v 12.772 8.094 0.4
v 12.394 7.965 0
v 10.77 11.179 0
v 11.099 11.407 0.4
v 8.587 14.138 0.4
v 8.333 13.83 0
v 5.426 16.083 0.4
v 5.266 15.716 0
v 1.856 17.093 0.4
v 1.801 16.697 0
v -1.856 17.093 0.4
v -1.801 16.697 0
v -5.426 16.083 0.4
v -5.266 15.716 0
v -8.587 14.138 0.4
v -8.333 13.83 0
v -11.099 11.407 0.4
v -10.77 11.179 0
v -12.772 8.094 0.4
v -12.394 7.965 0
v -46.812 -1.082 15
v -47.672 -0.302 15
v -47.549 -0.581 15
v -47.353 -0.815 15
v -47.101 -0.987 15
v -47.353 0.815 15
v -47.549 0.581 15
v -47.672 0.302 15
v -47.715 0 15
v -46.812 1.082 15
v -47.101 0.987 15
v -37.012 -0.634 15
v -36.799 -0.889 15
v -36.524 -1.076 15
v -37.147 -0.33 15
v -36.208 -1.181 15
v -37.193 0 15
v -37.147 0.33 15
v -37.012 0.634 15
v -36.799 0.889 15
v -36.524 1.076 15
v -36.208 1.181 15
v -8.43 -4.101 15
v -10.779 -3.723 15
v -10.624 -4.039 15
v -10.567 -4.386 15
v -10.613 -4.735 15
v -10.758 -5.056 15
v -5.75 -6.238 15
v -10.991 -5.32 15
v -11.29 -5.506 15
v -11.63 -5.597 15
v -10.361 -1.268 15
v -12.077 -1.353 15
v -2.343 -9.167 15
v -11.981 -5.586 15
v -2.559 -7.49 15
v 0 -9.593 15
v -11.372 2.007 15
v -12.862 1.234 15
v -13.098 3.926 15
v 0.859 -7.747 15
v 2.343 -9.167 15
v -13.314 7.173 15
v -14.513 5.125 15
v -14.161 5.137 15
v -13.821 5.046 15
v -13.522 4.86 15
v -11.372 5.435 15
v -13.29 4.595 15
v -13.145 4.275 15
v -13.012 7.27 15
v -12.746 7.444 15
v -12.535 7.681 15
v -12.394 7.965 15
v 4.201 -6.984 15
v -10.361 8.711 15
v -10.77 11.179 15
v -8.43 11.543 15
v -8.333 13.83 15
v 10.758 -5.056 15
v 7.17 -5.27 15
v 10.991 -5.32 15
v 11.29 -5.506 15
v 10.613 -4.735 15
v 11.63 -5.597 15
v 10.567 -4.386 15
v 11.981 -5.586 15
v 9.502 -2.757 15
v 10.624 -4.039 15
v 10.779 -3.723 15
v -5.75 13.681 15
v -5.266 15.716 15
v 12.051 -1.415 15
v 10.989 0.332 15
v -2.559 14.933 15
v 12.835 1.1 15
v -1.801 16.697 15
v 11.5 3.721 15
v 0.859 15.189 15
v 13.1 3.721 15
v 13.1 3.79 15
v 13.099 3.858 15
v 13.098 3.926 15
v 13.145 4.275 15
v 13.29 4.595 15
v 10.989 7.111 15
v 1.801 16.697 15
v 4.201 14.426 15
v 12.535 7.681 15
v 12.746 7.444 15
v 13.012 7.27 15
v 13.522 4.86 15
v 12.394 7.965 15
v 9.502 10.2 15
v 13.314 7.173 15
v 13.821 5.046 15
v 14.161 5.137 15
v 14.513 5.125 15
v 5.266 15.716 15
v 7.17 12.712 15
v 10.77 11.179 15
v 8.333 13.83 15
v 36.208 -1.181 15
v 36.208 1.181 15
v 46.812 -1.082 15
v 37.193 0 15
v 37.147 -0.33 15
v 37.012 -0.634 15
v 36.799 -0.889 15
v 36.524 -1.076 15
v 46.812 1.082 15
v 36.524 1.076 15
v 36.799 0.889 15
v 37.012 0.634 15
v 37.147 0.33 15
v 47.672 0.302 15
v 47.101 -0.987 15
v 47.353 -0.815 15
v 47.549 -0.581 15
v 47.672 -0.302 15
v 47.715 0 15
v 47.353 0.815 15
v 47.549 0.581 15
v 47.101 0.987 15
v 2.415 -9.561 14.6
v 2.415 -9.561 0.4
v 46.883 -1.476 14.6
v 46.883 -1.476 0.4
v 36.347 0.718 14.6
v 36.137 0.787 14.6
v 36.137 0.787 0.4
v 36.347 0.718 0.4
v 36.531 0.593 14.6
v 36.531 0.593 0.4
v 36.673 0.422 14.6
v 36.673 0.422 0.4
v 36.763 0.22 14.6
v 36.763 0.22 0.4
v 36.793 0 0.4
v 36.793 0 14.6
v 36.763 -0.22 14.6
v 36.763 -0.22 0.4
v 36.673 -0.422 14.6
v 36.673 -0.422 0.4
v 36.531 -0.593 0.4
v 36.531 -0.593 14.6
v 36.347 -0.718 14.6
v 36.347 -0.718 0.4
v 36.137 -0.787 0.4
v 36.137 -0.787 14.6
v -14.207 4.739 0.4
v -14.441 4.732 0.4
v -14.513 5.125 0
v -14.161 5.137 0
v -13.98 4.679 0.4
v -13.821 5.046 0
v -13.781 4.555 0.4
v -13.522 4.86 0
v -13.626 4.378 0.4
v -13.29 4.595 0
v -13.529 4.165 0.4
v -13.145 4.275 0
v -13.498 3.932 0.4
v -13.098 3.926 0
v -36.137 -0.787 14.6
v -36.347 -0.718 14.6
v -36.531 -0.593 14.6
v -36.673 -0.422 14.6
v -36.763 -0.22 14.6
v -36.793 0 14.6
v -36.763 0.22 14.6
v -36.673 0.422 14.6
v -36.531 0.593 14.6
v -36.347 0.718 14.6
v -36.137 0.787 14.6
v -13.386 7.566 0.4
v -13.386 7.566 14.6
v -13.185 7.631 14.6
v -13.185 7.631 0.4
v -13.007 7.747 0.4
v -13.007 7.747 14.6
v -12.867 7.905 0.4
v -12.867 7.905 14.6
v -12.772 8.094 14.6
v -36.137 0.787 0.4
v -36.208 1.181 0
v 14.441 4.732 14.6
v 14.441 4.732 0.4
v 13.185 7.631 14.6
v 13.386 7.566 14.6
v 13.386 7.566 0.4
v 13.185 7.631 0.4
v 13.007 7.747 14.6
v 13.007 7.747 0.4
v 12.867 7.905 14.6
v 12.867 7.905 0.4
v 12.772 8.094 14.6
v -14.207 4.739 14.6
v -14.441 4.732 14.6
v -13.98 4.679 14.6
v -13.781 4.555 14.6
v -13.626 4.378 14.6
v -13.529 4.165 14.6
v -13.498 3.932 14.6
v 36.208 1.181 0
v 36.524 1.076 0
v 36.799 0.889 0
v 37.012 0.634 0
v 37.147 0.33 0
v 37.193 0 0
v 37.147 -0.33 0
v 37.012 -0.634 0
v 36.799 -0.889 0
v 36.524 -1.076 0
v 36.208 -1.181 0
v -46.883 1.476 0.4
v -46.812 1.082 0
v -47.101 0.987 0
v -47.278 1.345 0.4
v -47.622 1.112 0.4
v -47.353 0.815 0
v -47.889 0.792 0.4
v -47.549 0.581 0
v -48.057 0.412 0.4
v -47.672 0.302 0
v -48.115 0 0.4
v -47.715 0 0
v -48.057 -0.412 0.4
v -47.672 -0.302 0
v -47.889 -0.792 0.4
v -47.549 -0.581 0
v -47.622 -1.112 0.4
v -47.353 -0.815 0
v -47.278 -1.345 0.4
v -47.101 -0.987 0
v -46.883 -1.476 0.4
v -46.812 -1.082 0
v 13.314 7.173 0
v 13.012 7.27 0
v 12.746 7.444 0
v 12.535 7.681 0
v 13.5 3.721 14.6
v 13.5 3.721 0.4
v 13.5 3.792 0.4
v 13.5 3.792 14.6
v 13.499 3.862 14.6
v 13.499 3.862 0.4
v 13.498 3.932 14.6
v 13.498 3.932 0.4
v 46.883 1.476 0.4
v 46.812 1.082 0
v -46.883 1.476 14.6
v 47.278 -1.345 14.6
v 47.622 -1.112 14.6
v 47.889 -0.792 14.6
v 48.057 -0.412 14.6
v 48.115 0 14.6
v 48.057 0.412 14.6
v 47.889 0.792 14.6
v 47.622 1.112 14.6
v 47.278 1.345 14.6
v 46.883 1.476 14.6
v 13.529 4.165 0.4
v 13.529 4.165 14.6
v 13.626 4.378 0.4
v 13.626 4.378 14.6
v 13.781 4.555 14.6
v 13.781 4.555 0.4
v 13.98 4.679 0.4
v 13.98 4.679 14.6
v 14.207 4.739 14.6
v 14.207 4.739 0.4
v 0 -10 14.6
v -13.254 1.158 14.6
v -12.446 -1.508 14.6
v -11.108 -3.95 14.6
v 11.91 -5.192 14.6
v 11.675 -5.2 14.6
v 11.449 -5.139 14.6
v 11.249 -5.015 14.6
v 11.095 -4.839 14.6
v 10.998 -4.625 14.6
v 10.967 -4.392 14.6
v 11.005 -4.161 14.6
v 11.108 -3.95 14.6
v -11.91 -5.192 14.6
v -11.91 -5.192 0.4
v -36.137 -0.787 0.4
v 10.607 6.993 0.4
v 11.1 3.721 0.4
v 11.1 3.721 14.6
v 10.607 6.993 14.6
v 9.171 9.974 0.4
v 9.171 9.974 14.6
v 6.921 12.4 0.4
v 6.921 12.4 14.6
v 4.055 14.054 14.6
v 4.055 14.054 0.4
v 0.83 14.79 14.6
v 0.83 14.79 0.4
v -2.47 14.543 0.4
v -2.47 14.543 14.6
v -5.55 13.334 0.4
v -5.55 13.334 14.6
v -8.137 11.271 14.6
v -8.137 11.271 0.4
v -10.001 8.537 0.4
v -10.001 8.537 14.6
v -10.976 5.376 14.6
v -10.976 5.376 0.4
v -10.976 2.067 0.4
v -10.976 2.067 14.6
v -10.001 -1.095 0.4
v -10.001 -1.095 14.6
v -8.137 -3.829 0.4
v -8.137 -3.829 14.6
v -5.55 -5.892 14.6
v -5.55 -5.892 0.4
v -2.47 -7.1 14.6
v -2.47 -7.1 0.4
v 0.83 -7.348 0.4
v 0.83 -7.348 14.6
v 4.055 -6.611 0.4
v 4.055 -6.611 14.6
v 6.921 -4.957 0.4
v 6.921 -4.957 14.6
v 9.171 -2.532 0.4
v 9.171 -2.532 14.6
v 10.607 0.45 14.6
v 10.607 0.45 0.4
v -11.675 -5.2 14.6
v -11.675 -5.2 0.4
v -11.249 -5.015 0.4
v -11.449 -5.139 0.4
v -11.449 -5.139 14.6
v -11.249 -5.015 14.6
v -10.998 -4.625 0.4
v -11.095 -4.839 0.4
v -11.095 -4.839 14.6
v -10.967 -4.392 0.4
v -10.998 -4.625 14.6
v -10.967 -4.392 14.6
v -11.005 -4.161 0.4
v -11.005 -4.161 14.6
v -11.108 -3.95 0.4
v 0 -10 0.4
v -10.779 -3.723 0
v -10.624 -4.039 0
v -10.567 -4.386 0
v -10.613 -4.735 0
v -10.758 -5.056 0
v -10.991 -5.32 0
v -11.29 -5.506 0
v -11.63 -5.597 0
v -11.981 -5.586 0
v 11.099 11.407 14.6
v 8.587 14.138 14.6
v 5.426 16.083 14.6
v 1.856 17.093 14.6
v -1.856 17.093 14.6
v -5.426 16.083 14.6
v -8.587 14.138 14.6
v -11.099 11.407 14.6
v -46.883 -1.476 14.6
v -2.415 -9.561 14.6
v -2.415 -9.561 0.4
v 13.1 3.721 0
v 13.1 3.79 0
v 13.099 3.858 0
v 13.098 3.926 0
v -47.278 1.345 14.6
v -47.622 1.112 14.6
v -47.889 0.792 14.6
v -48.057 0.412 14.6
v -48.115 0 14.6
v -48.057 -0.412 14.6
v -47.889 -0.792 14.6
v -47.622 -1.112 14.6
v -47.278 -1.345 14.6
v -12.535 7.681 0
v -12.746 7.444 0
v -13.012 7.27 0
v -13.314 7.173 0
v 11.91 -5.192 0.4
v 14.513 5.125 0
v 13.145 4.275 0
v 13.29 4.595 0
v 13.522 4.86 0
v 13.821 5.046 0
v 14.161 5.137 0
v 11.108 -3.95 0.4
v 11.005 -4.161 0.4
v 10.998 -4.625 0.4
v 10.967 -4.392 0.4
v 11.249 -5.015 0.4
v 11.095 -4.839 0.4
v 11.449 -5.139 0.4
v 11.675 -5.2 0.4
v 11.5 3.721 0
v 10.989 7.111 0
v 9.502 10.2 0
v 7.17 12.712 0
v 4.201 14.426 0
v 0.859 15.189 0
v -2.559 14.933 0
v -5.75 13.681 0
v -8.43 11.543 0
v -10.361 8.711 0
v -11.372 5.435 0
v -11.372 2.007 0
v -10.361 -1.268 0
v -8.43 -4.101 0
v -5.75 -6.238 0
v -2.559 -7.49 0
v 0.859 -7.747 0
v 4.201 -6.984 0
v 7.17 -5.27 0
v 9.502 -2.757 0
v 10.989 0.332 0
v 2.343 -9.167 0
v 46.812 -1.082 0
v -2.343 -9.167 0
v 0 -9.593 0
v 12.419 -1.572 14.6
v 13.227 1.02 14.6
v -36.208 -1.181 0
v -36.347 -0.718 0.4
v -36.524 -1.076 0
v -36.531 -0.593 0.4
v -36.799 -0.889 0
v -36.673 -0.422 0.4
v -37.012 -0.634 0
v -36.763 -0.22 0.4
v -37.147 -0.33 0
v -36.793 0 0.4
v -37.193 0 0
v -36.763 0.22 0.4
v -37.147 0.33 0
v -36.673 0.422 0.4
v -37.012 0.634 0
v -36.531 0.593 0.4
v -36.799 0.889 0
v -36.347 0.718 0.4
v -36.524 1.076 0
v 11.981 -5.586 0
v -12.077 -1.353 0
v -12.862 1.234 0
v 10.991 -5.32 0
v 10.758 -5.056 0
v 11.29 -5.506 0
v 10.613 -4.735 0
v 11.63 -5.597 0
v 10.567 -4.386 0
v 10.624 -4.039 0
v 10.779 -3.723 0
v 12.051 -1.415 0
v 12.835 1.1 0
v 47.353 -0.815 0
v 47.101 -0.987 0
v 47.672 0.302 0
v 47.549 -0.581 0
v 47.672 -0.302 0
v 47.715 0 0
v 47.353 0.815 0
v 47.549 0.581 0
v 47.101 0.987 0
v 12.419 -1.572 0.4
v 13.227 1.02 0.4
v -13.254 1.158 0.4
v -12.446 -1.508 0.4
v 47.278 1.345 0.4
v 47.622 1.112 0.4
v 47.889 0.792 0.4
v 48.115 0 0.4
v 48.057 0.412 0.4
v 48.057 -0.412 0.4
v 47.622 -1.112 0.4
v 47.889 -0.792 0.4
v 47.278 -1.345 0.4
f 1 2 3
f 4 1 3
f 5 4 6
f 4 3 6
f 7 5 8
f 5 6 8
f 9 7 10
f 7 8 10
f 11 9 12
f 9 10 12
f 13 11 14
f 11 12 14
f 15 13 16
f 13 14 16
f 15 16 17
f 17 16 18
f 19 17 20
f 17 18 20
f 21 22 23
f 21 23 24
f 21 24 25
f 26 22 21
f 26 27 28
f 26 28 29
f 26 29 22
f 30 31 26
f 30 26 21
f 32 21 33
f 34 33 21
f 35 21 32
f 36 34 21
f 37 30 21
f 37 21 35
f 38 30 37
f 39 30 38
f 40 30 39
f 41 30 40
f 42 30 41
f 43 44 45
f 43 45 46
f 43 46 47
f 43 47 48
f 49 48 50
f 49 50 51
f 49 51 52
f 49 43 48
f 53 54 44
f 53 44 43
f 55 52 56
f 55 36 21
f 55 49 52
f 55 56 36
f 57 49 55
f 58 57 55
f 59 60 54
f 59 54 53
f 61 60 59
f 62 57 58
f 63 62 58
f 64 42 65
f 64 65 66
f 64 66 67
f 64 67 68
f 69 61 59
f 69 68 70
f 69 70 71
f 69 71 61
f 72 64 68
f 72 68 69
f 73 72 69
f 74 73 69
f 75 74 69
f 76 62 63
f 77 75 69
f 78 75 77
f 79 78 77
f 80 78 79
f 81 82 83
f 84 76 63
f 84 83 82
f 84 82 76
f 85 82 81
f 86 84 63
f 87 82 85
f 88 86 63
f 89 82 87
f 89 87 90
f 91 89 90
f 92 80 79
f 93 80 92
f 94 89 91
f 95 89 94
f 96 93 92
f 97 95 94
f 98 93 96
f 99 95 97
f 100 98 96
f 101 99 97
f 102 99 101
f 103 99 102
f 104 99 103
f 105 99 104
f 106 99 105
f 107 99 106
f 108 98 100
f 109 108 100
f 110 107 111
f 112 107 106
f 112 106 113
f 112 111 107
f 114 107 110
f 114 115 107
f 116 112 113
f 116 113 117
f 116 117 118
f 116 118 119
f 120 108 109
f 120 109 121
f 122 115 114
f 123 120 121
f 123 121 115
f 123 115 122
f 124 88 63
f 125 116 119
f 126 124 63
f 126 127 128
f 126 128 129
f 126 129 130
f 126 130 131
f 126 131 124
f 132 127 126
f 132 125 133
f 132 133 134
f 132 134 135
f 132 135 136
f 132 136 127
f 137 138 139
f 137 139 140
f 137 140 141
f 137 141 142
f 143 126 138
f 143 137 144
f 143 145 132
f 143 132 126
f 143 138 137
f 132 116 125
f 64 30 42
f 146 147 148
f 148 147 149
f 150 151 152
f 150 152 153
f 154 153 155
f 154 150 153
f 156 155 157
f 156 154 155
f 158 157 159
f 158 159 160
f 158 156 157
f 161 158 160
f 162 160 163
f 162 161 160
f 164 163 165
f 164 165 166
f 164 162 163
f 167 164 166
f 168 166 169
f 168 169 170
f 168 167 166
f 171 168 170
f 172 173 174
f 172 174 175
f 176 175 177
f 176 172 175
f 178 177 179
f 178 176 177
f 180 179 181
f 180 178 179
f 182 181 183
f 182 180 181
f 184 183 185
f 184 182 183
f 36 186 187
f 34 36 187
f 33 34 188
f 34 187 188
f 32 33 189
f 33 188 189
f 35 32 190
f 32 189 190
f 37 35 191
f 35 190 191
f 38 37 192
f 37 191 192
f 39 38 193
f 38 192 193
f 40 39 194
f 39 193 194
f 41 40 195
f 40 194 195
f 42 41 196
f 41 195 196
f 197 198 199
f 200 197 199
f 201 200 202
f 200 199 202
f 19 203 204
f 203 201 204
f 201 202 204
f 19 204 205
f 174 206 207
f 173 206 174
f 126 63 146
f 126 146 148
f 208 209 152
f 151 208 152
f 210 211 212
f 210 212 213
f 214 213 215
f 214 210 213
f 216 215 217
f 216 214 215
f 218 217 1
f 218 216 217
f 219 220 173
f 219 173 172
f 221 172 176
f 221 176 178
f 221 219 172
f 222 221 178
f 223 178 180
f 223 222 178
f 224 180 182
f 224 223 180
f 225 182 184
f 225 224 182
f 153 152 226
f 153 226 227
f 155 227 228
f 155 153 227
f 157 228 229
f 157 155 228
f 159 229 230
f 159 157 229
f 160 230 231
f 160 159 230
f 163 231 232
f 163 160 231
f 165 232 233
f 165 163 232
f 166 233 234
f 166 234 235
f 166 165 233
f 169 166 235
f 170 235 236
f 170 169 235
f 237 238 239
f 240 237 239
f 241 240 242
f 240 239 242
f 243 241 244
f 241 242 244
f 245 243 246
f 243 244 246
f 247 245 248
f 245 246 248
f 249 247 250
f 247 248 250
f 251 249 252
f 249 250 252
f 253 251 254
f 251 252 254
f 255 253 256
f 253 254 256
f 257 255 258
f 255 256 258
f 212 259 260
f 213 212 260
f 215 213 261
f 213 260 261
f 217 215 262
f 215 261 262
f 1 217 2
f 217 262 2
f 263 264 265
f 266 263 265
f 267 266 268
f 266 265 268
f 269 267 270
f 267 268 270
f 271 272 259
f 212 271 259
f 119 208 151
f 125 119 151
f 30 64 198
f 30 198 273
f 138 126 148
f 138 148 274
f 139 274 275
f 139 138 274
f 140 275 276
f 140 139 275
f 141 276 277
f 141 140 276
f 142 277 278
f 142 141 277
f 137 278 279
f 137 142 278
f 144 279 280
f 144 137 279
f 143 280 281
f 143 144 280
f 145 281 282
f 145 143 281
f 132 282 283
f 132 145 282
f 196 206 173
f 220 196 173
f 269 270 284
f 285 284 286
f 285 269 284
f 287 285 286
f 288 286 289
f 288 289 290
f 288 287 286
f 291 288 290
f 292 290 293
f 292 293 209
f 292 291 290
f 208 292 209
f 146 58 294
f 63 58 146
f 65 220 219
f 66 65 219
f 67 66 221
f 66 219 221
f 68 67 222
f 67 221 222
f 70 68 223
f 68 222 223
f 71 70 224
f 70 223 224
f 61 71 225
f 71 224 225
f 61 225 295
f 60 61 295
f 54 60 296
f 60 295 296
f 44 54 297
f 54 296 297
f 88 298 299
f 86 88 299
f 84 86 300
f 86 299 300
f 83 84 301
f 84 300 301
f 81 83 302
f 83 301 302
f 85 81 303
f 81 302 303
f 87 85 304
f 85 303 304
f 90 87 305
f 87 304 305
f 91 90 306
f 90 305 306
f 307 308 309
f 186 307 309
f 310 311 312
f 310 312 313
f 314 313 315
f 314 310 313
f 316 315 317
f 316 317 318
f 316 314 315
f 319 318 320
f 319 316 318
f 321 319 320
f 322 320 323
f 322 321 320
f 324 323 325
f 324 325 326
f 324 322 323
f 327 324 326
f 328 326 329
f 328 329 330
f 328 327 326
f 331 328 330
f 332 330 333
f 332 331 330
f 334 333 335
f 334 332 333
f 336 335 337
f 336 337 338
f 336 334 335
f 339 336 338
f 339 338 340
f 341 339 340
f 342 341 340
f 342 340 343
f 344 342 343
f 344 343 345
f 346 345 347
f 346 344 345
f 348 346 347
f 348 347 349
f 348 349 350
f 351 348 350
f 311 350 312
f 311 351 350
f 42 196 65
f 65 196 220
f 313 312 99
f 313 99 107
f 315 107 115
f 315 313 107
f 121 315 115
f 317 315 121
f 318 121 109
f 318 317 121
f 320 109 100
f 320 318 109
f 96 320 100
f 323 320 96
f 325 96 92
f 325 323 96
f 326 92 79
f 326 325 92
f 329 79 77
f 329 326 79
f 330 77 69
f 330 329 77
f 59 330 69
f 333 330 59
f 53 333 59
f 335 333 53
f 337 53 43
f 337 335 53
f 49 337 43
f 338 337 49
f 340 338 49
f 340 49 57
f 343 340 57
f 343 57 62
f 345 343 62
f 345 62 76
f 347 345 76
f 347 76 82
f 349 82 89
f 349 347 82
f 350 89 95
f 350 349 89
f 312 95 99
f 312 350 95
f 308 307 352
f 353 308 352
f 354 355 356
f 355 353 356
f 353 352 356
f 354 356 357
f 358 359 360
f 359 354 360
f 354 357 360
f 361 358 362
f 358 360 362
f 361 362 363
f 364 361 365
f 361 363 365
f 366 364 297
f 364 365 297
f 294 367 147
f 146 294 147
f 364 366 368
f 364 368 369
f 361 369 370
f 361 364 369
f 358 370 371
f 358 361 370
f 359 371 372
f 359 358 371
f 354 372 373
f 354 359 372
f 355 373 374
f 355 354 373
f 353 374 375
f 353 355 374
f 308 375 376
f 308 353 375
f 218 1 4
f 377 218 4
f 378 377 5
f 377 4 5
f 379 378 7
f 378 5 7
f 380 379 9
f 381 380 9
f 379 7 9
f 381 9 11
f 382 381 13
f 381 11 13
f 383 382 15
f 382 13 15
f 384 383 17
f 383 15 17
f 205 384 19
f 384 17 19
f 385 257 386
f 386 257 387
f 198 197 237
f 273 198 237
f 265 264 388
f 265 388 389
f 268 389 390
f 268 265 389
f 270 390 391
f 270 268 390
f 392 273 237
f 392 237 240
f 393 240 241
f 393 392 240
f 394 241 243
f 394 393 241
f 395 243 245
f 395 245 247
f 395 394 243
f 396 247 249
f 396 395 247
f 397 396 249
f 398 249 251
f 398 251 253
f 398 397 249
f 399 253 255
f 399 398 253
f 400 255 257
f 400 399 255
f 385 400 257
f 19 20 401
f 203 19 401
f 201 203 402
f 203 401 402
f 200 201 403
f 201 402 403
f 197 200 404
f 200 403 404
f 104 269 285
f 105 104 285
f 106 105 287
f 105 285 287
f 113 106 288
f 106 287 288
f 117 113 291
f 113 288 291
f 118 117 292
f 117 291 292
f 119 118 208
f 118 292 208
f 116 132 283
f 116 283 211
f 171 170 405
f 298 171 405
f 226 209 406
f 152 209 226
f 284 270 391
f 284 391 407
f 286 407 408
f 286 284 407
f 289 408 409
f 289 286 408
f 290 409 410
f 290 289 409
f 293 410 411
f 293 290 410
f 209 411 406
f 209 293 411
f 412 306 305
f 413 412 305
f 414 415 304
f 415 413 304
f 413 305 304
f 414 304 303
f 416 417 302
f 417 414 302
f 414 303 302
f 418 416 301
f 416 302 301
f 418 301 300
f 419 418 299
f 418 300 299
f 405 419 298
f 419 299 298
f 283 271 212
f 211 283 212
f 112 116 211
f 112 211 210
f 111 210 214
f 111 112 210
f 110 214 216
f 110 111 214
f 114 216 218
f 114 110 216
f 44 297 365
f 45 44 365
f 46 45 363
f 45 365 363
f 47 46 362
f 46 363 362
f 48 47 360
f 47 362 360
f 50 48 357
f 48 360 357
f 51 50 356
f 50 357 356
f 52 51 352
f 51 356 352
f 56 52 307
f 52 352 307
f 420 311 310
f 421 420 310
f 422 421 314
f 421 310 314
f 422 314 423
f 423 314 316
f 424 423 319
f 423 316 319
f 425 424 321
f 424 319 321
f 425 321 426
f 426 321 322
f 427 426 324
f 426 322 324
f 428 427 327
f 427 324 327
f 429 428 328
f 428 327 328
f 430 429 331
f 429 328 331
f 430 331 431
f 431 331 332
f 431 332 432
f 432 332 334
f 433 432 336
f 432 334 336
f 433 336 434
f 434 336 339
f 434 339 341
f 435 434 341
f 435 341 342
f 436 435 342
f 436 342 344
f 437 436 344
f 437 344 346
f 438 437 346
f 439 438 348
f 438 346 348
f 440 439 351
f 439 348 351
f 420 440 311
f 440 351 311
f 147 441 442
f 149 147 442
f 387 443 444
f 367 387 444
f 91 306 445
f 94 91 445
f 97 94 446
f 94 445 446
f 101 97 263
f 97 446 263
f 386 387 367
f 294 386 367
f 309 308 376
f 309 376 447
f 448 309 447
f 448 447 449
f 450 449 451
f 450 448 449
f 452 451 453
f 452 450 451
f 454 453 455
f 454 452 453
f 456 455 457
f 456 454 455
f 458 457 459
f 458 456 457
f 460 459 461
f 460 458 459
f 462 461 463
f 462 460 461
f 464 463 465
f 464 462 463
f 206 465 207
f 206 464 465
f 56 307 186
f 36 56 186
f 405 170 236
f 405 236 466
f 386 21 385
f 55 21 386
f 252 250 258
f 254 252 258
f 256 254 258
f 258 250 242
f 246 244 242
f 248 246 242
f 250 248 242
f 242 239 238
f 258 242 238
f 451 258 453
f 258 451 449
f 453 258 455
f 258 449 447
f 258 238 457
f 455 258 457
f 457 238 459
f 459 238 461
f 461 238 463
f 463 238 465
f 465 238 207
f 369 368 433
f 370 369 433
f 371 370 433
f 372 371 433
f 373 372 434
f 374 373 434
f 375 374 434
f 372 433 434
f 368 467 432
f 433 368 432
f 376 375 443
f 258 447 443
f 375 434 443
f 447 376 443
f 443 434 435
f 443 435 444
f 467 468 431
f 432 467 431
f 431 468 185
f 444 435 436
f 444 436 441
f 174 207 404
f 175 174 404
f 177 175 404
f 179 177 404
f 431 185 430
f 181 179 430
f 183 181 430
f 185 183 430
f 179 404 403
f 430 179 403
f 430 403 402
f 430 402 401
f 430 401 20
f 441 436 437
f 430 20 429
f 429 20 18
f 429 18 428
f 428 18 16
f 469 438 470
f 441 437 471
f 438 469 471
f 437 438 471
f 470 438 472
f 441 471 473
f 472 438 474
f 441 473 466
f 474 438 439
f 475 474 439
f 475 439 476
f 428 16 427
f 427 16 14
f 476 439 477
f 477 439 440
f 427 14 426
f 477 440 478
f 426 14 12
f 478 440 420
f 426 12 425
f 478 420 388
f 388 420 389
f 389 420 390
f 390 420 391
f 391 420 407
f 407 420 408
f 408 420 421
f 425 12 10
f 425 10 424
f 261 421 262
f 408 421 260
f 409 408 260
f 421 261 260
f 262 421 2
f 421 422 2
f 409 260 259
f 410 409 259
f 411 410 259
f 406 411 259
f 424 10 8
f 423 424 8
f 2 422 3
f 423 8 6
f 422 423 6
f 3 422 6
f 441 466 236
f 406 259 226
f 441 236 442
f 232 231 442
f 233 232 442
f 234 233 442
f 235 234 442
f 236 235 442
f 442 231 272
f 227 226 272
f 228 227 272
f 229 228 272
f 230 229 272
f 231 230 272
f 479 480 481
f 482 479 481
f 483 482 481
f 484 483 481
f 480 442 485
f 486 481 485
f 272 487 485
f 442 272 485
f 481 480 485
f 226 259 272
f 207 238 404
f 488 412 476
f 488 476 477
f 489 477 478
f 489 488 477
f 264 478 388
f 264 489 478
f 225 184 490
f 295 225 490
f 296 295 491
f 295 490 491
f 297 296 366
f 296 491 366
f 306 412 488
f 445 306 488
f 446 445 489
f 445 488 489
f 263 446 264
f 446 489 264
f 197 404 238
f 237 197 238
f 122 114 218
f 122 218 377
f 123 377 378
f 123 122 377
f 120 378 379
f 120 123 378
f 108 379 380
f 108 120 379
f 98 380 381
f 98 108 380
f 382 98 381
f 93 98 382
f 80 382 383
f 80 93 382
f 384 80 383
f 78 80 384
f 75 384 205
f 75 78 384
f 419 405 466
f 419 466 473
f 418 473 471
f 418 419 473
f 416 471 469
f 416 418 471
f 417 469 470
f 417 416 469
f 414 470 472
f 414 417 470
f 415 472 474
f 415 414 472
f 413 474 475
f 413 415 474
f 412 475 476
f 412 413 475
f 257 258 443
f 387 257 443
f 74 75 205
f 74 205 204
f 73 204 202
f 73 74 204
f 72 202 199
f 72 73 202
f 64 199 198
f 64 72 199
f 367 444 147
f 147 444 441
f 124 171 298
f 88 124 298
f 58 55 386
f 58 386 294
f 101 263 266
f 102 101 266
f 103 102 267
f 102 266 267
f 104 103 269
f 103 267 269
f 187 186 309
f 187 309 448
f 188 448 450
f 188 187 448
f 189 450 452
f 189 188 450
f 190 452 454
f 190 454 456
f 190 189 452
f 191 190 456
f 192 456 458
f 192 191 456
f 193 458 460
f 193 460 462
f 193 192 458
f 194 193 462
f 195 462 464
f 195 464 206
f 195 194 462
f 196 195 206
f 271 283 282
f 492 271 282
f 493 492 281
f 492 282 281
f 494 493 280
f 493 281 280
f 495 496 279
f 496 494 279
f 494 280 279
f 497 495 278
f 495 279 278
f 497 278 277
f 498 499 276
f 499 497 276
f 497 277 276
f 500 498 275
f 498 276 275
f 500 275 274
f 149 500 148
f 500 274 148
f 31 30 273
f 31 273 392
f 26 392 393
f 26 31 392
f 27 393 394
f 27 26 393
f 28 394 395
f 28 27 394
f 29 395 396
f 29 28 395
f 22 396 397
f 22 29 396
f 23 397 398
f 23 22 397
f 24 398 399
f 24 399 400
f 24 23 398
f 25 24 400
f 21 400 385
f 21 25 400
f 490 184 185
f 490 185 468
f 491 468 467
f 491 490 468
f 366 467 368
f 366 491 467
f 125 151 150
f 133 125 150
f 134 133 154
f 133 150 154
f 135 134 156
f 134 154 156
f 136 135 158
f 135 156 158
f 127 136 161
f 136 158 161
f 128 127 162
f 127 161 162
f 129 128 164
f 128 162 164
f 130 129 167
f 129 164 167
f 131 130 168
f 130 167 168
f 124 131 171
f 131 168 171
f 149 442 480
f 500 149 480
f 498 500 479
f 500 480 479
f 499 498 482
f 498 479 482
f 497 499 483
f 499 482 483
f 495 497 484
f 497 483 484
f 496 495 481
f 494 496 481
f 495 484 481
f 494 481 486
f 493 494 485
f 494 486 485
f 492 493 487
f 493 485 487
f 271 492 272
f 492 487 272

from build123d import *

# Parameters (mm, degrees)
F0_R     = 11.1
F1_DEPTH = 15
F2_R     = 0.8
F3_R     = 1.5
F4_SIZE  = 0.4


with BuildPart() as f1:
    # F0 (on Top) → F1 (new body)
    with BuildSketch(Plane.XY):
        with BuildLine():
            Line((-12.915164, 7.651788), (-55, 0))
            Line((-55, 0), (-2.414954, -9.560917))
            ThreePointArc((-2.414954, -9.560917), (-6.417434, -8.155817), (-9.786299, -5.578047))
            Line((-9.786299, -5.578047), (-40.465558, 0))
            Line((-40.465558, 0), (-13.447354, 4.912401))
            ThreePointArc((-13.447354, 4.912401), (-13.252232, 6.295883), (-12.915164, 7.651788))
        make_face()
        with BuildLine():
            ThreePointArc((12.915164, 7.651788), (0, 17.221326), (-12.915164, 7.651788))
            ThreePointArc((-12.915164, 7.651788), (-13.252232, 6.295883), (-13.447354, 4.912401))
            ThreePointArc((-13.447354, 4.912401), (-12.746099, -0.726927), (-9.786299, -5.578047))
            ThreePointArc((-9.786299, -5.578047), (-6.417434, -8.155817), (-2.414954, -9.560917))
            ThreePointArc((-2.414954, -9.560917), (0, -9.778674), (2.414954, -9.560917))
            ThreePointArc((2.414954, -9.560917), (6.417434, -8.155817), (9.786299, -5.578047))
            ThreePointArc((9.786299, -5.578047), (12.537245, -1.285417), (13.5, 3.721326))
            ThreePointArc((13.5, 3.721326), (13.486832, 4.317445), (13.447354, 4.912401))
            ThreePointArc((13.447354, 4.912401), (13.252232, 6.295883), (12.915164, 7.651788))
        make_face()
        with Locations((0, 3.721326)):
            Circle(F0_R, mode=Mode.SUBTRACT)
        with BuildLine():
            ThreePointArc((2.414954, -9.560917), (0, -9.778674), (-2.414954, -9.560917))
            Line((-2.414954, -9.560917), (0, -10))
            Line((0, -10), (2.414954, -9.560917))
        make_face()
        with BuildLine():
            Line((55, 0), (12.915164, 7.651788))
            ThreePointArc((12.915164, 7.651788), (13.252232, 6.295883), (13.447354, 4.912401))
            Line((13.447354, 4.912401), (40.465558, 0))
            Line((40.465558, 0), (9.786299, -5.578047))
            ThreePointArc((9.786299, -5.578047), (6.417434, -8.155817), (2.414954, -9.560917))
            Line((2.414954, -9.560917), (55, 0))
        make_face()
    extrude(amount=F1_DEPTH)

    # F2
    f2_edges = [f1.edges().sort_by_distance(p)[0] for p in [
        (-40.465558, 0, 7.5),
        (40.465558, 0, 7.5),
        (-9.786299, -5.578047, 7.5),
        (9.786299, -5.578047, 7.5),
        (-13.447354, 4.912401, 7.5),
        (13.447354, 4.912401, 7.5),
        (12.915164, 7.651788, 7.5),
        (-12.915164, 7.651788, 7.5),
    ]]
    fillet(f2_edges, radius=F2_R)

    # F3
    f3_edges = [f1.edges().sort_by_distance(p)[0] for p in [
        (55, 0, 7.5),
        (-55, 0, 7.5),
    ]]
    fillet(f3_edges, radius=F3_R)

    # F4
    f4_edges = [f1.edges().sort_by_distance(p)[0] for p in [
        (-30.134502, 4.521, 15),
        (-48.114745, 0, 15),
        (-13.007334, 7.746806, 15),
        (-23.441537, -5.737902, 15),
        (0, 17.221326, 15),
        (23.441537, -5.737902, 15),
        (13.007334, 7.746806, 15),
        (48.114745, 0, 15),
        (30.134502, 4.521, 15),
        (-11.1, 3.721326, 15),
        (12.919215, -0.195801, 15),
        (13.78088, 4.554757, 15),
        (11.094527, -4.838669, 15),
        (25.288948, 2.759384, 15),
        (24.023167, -2.989526, 15),
        (36.793422, 0, 15),
        (-24.023167, -2.989526, 15),
        (-11.094527, -4.838669, 15),
        (-36.793422, 0, 15),
        (-12.919215, -0.195801, 15),
        (-25.288948, 2.759384, 15),
        (-13.78088, 4.554757, 15),
        (-30.134502, 4.521, 0),
        (-48.114745, 0, 0),
        (-13.007334, 7.746806, 0),
        (-23.441537, -5.737902, 0),
        (0, 17.221326, 0),
        (23.441537, -5.737902, 0),
        (13.007334, 7.746806, 0),
        (48.114745, 0, 0),
        (30.134502, 4.521, 0),
        (-11.1, 3.721326, 0),
        (12.919215, -0.195801, 0),
        (11.094527, -4.838669, 0),
        (13.78088, 4.554757, 0),
        (24.023167, -2.989526, 0),
        (25.288948, 2.759384, 0),
        (36.793422, 0, 0),
        (-24.023167, -2.989526, 0),
        (-11.094527, -4.838669, 0),
        (-36.793422, 0, 0),
        (-12.919215, -0.195801, 0),
        (-25.288948, 2.759384, 0),
        (-13.78088, 4.554757, 0),
    ]]
    chamfer(f4_edges, length=F4_SIZE)


solid = f1.part
